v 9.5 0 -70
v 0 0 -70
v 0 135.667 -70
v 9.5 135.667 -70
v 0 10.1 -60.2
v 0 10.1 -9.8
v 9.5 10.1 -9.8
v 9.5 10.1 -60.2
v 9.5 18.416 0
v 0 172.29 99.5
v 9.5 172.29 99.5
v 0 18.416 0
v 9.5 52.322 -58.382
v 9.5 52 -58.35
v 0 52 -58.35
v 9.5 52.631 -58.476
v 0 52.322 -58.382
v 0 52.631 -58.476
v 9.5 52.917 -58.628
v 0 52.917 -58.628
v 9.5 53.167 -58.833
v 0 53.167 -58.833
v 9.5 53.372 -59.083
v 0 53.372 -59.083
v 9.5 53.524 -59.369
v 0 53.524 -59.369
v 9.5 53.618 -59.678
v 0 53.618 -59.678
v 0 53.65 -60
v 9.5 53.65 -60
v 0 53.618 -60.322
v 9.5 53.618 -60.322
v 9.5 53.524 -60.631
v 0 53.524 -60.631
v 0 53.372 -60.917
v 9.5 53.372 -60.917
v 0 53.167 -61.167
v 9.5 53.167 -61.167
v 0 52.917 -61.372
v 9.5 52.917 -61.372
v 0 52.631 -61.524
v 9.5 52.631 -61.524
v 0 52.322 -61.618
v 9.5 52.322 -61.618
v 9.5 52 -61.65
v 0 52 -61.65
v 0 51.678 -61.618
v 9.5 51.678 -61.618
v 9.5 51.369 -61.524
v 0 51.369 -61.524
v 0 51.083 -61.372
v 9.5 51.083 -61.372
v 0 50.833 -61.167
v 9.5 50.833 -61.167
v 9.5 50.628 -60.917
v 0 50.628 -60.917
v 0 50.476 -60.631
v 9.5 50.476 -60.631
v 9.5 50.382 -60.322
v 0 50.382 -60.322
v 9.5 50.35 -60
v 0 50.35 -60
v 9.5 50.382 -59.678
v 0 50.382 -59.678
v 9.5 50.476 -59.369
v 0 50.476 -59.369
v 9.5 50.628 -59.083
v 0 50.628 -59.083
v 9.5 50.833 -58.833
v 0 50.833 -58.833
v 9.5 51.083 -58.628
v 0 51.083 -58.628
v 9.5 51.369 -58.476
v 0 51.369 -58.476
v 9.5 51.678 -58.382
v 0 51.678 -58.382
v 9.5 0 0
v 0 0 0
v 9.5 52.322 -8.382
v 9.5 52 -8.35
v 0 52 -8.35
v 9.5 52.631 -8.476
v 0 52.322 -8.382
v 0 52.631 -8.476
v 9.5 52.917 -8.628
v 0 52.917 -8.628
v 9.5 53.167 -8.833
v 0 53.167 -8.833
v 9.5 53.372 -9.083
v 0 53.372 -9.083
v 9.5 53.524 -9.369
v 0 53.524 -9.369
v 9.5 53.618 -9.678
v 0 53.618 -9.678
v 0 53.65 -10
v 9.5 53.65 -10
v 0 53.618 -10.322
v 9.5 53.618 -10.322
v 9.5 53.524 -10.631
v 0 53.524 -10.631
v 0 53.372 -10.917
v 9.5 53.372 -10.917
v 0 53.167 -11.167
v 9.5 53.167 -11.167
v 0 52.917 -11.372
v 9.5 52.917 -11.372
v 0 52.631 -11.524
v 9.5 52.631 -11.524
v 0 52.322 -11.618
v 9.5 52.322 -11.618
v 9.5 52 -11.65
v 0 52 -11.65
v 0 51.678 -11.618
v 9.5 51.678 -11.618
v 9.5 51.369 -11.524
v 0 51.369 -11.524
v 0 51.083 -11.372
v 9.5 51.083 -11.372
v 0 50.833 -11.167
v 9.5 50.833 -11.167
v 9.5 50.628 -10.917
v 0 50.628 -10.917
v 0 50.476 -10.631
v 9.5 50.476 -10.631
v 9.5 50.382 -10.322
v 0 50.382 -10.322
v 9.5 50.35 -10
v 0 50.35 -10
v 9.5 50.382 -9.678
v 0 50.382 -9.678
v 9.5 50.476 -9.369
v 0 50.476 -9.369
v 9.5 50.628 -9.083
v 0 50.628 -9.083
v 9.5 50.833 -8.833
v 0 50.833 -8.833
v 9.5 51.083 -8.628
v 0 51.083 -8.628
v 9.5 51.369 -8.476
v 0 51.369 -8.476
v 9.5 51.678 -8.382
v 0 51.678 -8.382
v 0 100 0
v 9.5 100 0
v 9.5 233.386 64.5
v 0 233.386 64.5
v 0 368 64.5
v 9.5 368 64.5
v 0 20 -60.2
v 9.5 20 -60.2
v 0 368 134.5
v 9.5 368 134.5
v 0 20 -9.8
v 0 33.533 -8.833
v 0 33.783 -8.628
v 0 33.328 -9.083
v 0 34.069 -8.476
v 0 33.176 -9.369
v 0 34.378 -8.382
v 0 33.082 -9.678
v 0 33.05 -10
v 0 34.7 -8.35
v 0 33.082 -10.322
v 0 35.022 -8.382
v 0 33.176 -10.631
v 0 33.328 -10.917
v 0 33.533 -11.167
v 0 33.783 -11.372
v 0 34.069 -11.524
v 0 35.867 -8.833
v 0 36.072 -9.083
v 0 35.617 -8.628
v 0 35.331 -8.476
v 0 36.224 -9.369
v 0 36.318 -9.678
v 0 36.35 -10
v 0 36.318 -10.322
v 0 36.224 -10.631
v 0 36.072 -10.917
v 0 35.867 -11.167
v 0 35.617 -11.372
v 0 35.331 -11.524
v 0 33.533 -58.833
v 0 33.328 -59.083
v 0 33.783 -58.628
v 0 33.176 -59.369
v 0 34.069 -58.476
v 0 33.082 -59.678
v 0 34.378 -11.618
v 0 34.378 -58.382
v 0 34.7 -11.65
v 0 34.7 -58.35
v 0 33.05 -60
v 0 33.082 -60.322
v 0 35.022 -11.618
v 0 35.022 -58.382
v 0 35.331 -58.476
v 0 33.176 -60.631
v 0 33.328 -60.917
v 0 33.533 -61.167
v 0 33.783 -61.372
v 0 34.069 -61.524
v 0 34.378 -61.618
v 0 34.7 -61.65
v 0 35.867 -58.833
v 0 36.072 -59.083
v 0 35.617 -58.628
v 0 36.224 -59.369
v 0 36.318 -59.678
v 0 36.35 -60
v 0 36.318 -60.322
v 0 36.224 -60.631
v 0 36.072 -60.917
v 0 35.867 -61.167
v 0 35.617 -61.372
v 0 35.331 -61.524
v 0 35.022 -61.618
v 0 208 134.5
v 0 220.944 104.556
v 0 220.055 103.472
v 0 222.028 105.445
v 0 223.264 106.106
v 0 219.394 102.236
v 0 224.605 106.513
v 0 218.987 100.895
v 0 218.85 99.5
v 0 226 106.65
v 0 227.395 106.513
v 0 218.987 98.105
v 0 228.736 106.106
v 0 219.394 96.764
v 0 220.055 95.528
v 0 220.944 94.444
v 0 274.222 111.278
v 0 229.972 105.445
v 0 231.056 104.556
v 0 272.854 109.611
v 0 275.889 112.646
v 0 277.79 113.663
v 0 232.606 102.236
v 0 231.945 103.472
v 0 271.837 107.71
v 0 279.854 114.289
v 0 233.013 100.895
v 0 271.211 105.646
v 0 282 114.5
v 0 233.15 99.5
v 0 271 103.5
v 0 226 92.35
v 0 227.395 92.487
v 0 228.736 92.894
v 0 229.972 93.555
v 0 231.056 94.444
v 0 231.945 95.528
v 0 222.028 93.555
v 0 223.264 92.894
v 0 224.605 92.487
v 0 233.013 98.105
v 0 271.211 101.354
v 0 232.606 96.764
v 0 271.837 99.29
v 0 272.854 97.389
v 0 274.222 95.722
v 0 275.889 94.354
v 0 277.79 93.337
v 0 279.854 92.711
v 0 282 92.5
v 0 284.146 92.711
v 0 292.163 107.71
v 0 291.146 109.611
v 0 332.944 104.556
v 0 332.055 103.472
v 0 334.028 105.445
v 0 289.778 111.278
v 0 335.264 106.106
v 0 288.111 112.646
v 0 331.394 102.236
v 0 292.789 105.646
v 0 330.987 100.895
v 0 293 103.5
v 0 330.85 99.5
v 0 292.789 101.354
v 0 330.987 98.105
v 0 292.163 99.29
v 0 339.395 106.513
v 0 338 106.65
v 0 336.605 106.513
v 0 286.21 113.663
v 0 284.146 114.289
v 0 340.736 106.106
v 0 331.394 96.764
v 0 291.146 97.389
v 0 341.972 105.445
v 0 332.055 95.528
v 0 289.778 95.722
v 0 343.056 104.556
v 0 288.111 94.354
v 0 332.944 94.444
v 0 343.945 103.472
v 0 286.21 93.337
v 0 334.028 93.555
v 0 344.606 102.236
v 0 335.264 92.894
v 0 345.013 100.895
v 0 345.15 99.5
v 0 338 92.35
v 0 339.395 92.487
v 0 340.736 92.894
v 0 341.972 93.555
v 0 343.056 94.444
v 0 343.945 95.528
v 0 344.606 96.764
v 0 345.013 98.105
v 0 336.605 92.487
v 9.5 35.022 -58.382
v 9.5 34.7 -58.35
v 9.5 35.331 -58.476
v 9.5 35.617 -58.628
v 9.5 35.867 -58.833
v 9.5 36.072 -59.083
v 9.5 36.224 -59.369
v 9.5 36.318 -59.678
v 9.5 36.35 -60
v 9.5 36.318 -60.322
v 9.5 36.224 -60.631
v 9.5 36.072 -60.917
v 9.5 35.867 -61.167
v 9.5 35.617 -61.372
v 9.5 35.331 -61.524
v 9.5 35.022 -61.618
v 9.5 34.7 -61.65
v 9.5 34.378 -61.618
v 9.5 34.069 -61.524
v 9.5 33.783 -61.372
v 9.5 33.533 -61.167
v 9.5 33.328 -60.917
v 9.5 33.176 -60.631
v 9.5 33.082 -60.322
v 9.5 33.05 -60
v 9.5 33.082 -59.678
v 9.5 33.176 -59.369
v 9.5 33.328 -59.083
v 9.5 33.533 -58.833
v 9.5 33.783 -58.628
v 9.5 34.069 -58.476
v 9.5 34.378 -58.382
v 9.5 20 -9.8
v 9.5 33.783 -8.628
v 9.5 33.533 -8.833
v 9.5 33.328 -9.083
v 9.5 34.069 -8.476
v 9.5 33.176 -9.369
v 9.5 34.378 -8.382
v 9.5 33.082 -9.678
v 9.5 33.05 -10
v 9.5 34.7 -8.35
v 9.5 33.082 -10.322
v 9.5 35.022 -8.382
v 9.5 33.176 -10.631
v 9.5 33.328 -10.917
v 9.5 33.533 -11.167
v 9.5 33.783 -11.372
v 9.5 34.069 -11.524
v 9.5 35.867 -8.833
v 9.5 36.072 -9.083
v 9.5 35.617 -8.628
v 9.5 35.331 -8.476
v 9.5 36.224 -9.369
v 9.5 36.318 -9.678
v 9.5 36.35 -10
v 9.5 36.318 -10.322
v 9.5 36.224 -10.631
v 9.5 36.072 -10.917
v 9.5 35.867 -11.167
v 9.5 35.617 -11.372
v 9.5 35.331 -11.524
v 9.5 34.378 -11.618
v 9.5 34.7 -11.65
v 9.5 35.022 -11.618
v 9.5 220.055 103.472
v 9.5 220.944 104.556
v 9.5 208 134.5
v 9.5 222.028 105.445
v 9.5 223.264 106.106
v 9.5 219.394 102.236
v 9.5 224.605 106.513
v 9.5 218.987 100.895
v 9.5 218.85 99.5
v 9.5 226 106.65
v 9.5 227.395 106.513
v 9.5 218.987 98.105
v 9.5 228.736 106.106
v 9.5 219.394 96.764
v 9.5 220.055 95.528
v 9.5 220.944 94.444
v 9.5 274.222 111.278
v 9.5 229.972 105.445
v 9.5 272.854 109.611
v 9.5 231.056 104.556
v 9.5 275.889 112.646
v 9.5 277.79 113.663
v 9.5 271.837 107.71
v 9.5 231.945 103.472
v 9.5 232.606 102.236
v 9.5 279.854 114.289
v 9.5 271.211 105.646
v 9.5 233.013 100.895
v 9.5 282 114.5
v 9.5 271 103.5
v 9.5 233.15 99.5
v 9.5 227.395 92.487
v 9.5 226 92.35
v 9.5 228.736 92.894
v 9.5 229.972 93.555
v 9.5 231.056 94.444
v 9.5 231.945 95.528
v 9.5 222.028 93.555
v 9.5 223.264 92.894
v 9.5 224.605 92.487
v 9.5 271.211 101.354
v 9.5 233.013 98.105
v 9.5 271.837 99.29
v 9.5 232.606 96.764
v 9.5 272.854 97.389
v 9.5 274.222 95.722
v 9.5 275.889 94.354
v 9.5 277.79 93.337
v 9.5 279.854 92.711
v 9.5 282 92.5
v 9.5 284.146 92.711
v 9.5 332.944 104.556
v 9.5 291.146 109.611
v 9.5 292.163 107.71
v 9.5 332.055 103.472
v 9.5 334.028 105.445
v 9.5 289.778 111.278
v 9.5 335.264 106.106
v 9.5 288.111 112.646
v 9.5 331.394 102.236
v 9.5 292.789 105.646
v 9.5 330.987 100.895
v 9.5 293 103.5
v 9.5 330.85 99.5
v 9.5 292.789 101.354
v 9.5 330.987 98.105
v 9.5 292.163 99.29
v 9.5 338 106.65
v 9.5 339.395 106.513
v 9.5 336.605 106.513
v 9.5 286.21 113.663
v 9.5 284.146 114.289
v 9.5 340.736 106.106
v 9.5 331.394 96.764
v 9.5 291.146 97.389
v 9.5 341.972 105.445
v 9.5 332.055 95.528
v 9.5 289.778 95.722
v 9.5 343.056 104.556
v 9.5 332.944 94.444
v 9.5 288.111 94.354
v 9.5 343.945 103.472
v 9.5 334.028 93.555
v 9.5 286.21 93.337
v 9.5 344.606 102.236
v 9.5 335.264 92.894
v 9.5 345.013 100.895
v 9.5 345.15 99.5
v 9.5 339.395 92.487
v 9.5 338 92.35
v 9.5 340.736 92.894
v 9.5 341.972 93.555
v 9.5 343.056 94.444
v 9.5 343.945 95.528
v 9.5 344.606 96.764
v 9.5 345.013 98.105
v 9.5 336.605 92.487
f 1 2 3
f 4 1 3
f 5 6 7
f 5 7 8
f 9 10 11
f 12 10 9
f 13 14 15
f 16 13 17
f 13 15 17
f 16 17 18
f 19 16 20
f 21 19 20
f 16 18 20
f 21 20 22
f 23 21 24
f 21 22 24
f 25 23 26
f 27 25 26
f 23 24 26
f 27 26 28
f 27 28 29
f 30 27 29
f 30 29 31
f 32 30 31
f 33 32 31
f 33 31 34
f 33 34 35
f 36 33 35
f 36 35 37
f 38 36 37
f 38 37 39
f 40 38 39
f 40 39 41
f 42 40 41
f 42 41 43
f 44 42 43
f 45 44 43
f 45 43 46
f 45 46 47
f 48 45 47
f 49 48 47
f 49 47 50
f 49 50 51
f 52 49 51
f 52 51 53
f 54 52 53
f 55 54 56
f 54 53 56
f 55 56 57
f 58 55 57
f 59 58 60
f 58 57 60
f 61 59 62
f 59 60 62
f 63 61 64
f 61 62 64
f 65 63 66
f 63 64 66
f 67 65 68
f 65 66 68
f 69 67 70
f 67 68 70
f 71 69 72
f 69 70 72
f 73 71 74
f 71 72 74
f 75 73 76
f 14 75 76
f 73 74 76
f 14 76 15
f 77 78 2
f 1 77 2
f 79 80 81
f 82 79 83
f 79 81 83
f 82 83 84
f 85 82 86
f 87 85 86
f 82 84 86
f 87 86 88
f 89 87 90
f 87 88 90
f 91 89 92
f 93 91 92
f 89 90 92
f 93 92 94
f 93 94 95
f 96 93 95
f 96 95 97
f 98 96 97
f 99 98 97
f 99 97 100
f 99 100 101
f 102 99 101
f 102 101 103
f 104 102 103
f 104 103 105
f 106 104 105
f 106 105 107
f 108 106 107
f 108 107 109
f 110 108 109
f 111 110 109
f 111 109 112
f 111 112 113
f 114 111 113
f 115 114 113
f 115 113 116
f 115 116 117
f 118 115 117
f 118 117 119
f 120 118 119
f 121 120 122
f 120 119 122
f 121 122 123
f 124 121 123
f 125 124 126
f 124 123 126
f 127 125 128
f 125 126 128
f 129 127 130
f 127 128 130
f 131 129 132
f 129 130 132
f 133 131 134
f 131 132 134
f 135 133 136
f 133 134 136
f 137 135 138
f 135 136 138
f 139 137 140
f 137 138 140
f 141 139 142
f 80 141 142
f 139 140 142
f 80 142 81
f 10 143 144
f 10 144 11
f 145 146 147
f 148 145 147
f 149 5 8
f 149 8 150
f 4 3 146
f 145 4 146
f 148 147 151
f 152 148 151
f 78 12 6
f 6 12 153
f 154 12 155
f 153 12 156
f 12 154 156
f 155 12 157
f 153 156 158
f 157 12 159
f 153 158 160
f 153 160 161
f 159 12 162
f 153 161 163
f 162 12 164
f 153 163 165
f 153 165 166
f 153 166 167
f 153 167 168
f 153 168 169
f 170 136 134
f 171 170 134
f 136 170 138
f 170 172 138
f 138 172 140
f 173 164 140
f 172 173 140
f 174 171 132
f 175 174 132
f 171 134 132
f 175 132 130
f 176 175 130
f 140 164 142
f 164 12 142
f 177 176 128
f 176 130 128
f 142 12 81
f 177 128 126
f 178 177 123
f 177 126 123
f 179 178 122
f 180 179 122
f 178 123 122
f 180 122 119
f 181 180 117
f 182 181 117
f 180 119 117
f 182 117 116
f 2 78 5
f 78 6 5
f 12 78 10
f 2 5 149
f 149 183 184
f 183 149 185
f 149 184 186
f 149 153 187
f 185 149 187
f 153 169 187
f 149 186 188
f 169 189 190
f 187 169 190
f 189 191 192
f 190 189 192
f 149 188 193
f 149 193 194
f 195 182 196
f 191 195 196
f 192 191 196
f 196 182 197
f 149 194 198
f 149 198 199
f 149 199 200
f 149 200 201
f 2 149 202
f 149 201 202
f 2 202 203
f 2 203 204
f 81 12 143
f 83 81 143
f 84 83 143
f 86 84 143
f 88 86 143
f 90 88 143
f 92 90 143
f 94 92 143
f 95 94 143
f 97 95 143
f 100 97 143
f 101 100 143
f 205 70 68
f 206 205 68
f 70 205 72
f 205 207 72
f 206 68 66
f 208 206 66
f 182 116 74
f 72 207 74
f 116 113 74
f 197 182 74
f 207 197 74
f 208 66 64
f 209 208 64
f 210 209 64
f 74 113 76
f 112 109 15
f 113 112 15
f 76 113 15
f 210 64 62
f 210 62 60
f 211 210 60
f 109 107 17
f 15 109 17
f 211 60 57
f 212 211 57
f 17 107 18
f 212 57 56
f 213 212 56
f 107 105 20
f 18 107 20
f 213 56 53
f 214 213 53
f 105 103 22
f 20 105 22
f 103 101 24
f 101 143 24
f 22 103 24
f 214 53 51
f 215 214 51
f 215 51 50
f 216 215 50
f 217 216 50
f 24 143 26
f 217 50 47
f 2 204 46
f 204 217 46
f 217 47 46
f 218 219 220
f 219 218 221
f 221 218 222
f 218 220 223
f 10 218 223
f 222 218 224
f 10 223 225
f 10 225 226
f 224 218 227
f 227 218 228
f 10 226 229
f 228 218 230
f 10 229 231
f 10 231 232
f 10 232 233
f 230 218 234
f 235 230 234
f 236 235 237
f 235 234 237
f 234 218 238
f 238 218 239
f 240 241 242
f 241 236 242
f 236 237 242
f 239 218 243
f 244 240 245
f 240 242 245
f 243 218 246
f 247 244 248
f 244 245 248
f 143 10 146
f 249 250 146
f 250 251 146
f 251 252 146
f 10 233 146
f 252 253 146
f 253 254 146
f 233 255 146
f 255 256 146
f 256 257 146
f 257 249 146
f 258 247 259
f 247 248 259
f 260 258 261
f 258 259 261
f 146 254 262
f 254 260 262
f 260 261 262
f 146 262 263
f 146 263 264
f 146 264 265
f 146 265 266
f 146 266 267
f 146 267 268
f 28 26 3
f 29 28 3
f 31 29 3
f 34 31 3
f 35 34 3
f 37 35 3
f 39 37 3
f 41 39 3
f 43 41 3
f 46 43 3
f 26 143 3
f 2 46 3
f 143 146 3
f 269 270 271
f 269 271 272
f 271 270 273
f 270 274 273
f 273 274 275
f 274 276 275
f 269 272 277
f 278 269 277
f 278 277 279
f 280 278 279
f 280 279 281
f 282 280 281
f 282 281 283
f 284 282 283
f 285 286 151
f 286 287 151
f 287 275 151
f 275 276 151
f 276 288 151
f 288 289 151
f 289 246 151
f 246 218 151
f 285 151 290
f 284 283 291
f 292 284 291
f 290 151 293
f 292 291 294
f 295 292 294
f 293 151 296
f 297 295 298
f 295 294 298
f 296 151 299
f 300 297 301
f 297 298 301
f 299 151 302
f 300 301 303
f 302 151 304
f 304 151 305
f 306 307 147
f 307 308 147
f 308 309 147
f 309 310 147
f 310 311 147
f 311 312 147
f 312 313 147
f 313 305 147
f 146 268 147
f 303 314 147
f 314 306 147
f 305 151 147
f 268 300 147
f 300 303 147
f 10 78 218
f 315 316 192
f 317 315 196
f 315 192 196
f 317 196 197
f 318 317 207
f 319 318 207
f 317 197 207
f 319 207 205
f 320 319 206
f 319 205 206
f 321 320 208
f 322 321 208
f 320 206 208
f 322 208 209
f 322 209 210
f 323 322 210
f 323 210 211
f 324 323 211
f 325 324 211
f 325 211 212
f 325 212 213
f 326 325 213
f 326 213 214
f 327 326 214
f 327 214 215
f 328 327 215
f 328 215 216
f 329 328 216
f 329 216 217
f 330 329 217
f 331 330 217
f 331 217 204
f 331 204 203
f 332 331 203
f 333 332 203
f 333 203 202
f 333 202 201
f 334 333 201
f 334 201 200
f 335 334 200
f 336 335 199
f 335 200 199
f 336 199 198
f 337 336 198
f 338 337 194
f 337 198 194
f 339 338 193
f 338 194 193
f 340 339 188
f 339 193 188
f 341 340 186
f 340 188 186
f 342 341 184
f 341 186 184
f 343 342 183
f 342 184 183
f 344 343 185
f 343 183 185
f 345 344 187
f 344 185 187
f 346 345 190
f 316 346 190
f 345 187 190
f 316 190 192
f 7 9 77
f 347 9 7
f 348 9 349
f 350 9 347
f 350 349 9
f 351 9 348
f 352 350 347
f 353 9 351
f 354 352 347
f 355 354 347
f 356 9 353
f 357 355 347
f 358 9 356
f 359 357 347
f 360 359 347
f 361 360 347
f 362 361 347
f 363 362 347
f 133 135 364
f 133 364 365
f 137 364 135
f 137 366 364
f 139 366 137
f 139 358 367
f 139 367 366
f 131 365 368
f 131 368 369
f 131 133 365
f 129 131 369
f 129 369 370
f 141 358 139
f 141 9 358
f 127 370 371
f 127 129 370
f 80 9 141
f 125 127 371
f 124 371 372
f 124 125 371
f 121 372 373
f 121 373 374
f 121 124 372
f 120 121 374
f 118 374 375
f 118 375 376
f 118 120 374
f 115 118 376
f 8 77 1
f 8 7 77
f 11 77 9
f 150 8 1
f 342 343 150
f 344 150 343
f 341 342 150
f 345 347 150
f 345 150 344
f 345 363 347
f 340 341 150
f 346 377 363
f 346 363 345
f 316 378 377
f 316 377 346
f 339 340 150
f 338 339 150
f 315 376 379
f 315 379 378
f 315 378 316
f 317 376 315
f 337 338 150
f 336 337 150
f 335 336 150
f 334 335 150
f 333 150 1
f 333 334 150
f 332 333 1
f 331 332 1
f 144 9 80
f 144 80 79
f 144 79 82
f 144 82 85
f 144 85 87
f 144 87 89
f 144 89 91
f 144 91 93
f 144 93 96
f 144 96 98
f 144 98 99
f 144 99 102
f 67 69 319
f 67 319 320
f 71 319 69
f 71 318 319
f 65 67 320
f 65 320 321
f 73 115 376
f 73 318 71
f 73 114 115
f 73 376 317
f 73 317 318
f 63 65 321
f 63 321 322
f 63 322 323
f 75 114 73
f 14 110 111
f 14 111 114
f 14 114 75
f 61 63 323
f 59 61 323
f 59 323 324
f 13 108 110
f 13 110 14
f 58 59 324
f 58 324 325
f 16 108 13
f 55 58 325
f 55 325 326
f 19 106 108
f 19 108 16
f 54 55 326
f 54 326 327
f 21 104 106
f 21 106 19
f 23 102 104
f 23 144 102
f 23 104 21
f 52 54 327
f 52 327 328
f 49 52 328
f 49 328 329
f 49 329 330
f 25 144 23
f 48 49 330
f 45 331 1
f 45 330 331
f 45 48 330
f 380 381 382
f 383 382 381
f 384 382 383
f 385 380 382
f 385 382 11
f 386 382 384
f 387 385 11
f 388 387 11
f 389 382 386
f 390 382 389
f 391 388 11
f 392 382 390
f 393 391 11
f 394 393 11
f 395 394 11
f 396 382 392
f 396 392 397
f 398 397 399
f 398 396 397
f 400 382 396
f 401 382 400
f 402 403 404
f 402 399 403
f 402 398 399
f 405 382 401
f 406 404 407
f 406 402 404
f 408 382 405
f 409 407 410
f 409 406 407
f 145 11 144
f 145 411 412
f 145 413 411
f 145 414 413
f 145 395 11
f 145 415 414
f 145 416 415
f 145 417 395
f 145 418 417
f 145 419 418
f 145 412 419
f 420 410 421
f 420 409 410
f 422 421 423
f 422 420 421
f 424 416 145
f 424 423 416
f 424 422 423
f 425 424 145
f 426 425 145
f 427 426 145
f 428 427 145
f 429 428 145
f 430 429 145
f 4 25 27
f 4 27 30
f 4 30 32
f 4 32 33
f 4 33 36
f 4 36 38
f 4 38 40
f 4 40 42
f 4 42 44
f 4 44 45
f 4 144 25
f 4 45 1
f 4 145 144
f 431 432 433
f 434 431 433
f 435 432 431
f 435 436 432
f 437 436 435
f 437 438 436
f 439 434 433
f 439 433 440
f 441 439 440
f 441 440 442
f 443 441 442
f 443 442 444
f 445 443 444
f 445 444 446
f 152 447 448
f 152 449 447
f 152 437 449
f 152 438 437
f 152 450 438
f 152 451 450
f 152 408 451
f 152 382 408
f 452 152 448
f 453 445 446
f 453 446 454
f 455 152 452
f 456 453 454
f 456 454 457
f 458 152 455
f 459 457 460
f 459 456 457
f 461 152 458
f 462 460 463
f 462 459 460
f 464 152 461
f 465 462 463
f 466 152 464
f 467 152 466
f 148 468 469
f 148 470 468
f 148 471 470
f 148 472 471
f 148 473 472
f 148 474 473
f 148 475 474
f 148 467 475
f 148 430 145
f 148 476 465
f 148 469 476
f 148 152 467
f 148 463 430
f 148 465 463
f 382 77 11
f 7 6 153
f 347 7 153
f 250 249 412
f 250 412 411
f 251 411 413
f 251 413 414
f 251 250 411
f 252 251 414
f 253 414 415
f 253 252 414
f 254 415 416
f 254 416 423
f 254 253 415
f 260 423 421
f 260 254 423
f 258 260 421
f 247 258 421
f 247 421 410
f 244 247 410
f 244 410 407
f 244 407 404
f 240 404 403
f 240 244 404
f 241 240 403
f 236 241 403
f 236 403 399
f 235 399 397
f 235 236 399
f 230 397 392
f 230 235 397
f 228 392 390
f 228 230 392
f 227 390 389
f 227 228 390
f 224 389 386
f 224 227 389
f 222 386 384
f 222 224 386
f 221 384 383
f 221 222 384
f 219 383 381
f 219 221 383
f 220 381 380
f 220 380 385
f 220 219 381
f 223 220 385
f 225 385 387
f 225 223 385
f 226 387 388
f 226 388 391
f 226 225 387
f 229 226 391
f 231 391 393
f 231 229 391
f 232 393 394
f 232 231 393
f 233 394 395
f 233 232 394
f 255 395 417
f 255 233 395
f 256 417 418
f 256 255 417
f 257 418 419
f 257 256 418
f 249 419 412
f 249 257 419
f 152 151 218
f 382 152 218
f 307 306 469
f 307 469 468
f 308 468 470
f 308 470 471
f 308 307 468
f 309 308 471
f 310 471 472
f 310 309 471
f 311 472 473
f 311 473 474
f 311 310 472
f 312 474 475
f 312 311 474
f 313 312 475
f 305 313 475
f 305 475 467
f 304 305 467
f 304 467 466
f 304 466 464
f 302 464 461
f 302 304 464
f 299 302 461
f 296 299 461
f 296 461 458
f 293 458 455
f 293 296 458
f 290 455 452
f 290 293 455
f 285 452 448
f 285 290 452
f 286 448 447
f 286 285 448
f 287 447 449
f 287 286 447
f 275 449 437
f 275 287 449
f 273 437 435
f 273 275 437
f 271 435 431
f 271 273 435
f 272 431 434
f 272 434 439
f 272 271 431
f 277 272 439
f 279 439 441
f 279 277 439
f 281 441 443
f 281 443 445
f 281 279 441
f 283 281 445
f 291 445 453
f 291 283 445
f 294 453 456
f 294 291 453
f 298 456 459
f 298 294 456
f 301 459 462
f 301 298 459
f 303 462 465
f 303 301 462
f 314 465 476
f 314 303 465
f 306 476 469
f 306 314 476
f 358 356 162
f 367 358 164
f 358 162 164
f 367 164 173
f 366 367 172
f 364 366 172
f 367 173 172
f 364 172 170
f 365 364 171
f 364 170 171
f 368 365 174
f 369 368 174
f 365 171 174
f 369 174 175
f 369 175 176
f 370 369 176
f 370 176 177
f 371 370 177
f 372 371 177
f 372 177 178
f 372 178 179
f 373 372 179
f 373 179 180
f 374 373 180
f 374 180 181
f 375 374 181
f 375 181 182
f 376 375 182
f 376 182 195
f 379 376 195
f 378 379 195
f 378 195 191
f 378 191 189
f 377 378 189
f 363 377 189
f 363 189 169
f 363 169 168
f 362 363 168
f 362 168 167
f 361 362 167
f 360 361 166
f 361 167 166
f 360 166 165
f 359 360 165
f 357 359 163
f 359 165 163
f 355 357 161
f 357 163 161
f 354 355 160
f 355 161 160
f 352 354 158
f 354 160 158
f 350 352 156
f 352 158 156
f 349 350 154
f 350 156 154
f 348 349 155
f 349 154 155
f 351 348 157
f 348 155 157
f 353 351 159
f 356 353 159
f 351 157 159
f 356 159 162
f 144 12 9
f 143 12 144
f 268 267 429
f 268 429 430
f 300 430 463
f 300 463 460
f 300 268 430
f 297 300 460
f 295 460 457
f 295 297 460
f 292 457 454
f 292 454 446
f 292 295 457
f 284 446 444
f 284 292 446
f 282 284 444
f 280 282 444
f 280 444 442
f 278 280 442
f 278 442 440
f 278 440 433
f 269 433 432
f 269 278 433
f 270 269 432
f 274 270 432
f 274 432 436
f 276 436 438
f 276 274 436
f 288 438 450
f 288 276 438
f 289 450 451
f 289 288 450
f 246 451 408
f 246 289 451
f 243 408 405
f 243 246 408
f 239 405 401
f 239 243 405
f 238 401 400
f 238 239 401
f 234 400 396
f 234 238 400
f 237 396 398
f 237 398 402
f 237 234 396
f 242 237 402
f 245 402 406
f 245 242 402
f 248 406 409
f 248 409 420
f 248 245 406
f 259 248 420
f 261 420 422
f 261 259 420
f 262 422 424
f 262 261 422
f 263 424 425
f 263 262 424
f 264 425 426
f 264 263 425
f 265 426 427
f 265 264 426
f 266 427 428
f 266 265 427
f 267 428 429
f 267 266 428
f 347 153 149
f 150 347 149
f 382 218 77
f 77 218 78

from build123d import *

# Parameters (mm, degrees)
SKETCH1_R           = 7.15
SKETCH1_R_2         = 11
SKETCH1_W           = 50.4
SKETCH1_H           = 9.9
BOSS_EXTRUDE1_DEPTH = 9.5
M4_TAPPED_HOLE1_D   = 3.3


with BuildPart() as part:
    # Sketch1 → Boss-Extrude1 (new body)
    with BuildSketch(Plane(origin=(0, 0, 0), x_dir=(0, 0, -1), z_dir=(1, 0, 0))):
        Polygon((0, 0), (70, 0), (70, 135.667122158), (-64.5, 233.385504136), (-64.5, 368), (-134.5, 368), (-134.5, 208), align=None)
        with Locations((-99.5, 338)):
            Circle(SKETCH1_R, mode=Mode.SUBTRACT)
        with Locations((-99.5, 226)):
            Circle(SKETCH1_R, mode=Mode.SUBTRACT)
        with Locations((-103.5, 282)):
            Circle(SKETCH1_R_2, mode=Mode.SUBTRACT)
        Polygon((0, 18.416200794), (0, 100), (-99.5, 172.289806742), align=None, mode=Mode.SUBTRACT)
        with Locations((35, 15.05)):
            Rectangle(SKETCH1_W, SKETCH1_H, mode=Mode.SUBTRACT)
    extrude(amount=BOSS_EXTRUDE1_DEPTH)

    # M4 Tapped Hole1 (through all)
    with Locations(Plane(origin=(9.5, 0, 0), x_dir=(0, 0, -1), z_dir=(1, 0, 0))):
        with Locations((10, 34.7), (10, 52), (60, 34.7), (60, 52)):
            Hole(M4_TAPPED_HOLE1_D / 2)


solid = part.part
